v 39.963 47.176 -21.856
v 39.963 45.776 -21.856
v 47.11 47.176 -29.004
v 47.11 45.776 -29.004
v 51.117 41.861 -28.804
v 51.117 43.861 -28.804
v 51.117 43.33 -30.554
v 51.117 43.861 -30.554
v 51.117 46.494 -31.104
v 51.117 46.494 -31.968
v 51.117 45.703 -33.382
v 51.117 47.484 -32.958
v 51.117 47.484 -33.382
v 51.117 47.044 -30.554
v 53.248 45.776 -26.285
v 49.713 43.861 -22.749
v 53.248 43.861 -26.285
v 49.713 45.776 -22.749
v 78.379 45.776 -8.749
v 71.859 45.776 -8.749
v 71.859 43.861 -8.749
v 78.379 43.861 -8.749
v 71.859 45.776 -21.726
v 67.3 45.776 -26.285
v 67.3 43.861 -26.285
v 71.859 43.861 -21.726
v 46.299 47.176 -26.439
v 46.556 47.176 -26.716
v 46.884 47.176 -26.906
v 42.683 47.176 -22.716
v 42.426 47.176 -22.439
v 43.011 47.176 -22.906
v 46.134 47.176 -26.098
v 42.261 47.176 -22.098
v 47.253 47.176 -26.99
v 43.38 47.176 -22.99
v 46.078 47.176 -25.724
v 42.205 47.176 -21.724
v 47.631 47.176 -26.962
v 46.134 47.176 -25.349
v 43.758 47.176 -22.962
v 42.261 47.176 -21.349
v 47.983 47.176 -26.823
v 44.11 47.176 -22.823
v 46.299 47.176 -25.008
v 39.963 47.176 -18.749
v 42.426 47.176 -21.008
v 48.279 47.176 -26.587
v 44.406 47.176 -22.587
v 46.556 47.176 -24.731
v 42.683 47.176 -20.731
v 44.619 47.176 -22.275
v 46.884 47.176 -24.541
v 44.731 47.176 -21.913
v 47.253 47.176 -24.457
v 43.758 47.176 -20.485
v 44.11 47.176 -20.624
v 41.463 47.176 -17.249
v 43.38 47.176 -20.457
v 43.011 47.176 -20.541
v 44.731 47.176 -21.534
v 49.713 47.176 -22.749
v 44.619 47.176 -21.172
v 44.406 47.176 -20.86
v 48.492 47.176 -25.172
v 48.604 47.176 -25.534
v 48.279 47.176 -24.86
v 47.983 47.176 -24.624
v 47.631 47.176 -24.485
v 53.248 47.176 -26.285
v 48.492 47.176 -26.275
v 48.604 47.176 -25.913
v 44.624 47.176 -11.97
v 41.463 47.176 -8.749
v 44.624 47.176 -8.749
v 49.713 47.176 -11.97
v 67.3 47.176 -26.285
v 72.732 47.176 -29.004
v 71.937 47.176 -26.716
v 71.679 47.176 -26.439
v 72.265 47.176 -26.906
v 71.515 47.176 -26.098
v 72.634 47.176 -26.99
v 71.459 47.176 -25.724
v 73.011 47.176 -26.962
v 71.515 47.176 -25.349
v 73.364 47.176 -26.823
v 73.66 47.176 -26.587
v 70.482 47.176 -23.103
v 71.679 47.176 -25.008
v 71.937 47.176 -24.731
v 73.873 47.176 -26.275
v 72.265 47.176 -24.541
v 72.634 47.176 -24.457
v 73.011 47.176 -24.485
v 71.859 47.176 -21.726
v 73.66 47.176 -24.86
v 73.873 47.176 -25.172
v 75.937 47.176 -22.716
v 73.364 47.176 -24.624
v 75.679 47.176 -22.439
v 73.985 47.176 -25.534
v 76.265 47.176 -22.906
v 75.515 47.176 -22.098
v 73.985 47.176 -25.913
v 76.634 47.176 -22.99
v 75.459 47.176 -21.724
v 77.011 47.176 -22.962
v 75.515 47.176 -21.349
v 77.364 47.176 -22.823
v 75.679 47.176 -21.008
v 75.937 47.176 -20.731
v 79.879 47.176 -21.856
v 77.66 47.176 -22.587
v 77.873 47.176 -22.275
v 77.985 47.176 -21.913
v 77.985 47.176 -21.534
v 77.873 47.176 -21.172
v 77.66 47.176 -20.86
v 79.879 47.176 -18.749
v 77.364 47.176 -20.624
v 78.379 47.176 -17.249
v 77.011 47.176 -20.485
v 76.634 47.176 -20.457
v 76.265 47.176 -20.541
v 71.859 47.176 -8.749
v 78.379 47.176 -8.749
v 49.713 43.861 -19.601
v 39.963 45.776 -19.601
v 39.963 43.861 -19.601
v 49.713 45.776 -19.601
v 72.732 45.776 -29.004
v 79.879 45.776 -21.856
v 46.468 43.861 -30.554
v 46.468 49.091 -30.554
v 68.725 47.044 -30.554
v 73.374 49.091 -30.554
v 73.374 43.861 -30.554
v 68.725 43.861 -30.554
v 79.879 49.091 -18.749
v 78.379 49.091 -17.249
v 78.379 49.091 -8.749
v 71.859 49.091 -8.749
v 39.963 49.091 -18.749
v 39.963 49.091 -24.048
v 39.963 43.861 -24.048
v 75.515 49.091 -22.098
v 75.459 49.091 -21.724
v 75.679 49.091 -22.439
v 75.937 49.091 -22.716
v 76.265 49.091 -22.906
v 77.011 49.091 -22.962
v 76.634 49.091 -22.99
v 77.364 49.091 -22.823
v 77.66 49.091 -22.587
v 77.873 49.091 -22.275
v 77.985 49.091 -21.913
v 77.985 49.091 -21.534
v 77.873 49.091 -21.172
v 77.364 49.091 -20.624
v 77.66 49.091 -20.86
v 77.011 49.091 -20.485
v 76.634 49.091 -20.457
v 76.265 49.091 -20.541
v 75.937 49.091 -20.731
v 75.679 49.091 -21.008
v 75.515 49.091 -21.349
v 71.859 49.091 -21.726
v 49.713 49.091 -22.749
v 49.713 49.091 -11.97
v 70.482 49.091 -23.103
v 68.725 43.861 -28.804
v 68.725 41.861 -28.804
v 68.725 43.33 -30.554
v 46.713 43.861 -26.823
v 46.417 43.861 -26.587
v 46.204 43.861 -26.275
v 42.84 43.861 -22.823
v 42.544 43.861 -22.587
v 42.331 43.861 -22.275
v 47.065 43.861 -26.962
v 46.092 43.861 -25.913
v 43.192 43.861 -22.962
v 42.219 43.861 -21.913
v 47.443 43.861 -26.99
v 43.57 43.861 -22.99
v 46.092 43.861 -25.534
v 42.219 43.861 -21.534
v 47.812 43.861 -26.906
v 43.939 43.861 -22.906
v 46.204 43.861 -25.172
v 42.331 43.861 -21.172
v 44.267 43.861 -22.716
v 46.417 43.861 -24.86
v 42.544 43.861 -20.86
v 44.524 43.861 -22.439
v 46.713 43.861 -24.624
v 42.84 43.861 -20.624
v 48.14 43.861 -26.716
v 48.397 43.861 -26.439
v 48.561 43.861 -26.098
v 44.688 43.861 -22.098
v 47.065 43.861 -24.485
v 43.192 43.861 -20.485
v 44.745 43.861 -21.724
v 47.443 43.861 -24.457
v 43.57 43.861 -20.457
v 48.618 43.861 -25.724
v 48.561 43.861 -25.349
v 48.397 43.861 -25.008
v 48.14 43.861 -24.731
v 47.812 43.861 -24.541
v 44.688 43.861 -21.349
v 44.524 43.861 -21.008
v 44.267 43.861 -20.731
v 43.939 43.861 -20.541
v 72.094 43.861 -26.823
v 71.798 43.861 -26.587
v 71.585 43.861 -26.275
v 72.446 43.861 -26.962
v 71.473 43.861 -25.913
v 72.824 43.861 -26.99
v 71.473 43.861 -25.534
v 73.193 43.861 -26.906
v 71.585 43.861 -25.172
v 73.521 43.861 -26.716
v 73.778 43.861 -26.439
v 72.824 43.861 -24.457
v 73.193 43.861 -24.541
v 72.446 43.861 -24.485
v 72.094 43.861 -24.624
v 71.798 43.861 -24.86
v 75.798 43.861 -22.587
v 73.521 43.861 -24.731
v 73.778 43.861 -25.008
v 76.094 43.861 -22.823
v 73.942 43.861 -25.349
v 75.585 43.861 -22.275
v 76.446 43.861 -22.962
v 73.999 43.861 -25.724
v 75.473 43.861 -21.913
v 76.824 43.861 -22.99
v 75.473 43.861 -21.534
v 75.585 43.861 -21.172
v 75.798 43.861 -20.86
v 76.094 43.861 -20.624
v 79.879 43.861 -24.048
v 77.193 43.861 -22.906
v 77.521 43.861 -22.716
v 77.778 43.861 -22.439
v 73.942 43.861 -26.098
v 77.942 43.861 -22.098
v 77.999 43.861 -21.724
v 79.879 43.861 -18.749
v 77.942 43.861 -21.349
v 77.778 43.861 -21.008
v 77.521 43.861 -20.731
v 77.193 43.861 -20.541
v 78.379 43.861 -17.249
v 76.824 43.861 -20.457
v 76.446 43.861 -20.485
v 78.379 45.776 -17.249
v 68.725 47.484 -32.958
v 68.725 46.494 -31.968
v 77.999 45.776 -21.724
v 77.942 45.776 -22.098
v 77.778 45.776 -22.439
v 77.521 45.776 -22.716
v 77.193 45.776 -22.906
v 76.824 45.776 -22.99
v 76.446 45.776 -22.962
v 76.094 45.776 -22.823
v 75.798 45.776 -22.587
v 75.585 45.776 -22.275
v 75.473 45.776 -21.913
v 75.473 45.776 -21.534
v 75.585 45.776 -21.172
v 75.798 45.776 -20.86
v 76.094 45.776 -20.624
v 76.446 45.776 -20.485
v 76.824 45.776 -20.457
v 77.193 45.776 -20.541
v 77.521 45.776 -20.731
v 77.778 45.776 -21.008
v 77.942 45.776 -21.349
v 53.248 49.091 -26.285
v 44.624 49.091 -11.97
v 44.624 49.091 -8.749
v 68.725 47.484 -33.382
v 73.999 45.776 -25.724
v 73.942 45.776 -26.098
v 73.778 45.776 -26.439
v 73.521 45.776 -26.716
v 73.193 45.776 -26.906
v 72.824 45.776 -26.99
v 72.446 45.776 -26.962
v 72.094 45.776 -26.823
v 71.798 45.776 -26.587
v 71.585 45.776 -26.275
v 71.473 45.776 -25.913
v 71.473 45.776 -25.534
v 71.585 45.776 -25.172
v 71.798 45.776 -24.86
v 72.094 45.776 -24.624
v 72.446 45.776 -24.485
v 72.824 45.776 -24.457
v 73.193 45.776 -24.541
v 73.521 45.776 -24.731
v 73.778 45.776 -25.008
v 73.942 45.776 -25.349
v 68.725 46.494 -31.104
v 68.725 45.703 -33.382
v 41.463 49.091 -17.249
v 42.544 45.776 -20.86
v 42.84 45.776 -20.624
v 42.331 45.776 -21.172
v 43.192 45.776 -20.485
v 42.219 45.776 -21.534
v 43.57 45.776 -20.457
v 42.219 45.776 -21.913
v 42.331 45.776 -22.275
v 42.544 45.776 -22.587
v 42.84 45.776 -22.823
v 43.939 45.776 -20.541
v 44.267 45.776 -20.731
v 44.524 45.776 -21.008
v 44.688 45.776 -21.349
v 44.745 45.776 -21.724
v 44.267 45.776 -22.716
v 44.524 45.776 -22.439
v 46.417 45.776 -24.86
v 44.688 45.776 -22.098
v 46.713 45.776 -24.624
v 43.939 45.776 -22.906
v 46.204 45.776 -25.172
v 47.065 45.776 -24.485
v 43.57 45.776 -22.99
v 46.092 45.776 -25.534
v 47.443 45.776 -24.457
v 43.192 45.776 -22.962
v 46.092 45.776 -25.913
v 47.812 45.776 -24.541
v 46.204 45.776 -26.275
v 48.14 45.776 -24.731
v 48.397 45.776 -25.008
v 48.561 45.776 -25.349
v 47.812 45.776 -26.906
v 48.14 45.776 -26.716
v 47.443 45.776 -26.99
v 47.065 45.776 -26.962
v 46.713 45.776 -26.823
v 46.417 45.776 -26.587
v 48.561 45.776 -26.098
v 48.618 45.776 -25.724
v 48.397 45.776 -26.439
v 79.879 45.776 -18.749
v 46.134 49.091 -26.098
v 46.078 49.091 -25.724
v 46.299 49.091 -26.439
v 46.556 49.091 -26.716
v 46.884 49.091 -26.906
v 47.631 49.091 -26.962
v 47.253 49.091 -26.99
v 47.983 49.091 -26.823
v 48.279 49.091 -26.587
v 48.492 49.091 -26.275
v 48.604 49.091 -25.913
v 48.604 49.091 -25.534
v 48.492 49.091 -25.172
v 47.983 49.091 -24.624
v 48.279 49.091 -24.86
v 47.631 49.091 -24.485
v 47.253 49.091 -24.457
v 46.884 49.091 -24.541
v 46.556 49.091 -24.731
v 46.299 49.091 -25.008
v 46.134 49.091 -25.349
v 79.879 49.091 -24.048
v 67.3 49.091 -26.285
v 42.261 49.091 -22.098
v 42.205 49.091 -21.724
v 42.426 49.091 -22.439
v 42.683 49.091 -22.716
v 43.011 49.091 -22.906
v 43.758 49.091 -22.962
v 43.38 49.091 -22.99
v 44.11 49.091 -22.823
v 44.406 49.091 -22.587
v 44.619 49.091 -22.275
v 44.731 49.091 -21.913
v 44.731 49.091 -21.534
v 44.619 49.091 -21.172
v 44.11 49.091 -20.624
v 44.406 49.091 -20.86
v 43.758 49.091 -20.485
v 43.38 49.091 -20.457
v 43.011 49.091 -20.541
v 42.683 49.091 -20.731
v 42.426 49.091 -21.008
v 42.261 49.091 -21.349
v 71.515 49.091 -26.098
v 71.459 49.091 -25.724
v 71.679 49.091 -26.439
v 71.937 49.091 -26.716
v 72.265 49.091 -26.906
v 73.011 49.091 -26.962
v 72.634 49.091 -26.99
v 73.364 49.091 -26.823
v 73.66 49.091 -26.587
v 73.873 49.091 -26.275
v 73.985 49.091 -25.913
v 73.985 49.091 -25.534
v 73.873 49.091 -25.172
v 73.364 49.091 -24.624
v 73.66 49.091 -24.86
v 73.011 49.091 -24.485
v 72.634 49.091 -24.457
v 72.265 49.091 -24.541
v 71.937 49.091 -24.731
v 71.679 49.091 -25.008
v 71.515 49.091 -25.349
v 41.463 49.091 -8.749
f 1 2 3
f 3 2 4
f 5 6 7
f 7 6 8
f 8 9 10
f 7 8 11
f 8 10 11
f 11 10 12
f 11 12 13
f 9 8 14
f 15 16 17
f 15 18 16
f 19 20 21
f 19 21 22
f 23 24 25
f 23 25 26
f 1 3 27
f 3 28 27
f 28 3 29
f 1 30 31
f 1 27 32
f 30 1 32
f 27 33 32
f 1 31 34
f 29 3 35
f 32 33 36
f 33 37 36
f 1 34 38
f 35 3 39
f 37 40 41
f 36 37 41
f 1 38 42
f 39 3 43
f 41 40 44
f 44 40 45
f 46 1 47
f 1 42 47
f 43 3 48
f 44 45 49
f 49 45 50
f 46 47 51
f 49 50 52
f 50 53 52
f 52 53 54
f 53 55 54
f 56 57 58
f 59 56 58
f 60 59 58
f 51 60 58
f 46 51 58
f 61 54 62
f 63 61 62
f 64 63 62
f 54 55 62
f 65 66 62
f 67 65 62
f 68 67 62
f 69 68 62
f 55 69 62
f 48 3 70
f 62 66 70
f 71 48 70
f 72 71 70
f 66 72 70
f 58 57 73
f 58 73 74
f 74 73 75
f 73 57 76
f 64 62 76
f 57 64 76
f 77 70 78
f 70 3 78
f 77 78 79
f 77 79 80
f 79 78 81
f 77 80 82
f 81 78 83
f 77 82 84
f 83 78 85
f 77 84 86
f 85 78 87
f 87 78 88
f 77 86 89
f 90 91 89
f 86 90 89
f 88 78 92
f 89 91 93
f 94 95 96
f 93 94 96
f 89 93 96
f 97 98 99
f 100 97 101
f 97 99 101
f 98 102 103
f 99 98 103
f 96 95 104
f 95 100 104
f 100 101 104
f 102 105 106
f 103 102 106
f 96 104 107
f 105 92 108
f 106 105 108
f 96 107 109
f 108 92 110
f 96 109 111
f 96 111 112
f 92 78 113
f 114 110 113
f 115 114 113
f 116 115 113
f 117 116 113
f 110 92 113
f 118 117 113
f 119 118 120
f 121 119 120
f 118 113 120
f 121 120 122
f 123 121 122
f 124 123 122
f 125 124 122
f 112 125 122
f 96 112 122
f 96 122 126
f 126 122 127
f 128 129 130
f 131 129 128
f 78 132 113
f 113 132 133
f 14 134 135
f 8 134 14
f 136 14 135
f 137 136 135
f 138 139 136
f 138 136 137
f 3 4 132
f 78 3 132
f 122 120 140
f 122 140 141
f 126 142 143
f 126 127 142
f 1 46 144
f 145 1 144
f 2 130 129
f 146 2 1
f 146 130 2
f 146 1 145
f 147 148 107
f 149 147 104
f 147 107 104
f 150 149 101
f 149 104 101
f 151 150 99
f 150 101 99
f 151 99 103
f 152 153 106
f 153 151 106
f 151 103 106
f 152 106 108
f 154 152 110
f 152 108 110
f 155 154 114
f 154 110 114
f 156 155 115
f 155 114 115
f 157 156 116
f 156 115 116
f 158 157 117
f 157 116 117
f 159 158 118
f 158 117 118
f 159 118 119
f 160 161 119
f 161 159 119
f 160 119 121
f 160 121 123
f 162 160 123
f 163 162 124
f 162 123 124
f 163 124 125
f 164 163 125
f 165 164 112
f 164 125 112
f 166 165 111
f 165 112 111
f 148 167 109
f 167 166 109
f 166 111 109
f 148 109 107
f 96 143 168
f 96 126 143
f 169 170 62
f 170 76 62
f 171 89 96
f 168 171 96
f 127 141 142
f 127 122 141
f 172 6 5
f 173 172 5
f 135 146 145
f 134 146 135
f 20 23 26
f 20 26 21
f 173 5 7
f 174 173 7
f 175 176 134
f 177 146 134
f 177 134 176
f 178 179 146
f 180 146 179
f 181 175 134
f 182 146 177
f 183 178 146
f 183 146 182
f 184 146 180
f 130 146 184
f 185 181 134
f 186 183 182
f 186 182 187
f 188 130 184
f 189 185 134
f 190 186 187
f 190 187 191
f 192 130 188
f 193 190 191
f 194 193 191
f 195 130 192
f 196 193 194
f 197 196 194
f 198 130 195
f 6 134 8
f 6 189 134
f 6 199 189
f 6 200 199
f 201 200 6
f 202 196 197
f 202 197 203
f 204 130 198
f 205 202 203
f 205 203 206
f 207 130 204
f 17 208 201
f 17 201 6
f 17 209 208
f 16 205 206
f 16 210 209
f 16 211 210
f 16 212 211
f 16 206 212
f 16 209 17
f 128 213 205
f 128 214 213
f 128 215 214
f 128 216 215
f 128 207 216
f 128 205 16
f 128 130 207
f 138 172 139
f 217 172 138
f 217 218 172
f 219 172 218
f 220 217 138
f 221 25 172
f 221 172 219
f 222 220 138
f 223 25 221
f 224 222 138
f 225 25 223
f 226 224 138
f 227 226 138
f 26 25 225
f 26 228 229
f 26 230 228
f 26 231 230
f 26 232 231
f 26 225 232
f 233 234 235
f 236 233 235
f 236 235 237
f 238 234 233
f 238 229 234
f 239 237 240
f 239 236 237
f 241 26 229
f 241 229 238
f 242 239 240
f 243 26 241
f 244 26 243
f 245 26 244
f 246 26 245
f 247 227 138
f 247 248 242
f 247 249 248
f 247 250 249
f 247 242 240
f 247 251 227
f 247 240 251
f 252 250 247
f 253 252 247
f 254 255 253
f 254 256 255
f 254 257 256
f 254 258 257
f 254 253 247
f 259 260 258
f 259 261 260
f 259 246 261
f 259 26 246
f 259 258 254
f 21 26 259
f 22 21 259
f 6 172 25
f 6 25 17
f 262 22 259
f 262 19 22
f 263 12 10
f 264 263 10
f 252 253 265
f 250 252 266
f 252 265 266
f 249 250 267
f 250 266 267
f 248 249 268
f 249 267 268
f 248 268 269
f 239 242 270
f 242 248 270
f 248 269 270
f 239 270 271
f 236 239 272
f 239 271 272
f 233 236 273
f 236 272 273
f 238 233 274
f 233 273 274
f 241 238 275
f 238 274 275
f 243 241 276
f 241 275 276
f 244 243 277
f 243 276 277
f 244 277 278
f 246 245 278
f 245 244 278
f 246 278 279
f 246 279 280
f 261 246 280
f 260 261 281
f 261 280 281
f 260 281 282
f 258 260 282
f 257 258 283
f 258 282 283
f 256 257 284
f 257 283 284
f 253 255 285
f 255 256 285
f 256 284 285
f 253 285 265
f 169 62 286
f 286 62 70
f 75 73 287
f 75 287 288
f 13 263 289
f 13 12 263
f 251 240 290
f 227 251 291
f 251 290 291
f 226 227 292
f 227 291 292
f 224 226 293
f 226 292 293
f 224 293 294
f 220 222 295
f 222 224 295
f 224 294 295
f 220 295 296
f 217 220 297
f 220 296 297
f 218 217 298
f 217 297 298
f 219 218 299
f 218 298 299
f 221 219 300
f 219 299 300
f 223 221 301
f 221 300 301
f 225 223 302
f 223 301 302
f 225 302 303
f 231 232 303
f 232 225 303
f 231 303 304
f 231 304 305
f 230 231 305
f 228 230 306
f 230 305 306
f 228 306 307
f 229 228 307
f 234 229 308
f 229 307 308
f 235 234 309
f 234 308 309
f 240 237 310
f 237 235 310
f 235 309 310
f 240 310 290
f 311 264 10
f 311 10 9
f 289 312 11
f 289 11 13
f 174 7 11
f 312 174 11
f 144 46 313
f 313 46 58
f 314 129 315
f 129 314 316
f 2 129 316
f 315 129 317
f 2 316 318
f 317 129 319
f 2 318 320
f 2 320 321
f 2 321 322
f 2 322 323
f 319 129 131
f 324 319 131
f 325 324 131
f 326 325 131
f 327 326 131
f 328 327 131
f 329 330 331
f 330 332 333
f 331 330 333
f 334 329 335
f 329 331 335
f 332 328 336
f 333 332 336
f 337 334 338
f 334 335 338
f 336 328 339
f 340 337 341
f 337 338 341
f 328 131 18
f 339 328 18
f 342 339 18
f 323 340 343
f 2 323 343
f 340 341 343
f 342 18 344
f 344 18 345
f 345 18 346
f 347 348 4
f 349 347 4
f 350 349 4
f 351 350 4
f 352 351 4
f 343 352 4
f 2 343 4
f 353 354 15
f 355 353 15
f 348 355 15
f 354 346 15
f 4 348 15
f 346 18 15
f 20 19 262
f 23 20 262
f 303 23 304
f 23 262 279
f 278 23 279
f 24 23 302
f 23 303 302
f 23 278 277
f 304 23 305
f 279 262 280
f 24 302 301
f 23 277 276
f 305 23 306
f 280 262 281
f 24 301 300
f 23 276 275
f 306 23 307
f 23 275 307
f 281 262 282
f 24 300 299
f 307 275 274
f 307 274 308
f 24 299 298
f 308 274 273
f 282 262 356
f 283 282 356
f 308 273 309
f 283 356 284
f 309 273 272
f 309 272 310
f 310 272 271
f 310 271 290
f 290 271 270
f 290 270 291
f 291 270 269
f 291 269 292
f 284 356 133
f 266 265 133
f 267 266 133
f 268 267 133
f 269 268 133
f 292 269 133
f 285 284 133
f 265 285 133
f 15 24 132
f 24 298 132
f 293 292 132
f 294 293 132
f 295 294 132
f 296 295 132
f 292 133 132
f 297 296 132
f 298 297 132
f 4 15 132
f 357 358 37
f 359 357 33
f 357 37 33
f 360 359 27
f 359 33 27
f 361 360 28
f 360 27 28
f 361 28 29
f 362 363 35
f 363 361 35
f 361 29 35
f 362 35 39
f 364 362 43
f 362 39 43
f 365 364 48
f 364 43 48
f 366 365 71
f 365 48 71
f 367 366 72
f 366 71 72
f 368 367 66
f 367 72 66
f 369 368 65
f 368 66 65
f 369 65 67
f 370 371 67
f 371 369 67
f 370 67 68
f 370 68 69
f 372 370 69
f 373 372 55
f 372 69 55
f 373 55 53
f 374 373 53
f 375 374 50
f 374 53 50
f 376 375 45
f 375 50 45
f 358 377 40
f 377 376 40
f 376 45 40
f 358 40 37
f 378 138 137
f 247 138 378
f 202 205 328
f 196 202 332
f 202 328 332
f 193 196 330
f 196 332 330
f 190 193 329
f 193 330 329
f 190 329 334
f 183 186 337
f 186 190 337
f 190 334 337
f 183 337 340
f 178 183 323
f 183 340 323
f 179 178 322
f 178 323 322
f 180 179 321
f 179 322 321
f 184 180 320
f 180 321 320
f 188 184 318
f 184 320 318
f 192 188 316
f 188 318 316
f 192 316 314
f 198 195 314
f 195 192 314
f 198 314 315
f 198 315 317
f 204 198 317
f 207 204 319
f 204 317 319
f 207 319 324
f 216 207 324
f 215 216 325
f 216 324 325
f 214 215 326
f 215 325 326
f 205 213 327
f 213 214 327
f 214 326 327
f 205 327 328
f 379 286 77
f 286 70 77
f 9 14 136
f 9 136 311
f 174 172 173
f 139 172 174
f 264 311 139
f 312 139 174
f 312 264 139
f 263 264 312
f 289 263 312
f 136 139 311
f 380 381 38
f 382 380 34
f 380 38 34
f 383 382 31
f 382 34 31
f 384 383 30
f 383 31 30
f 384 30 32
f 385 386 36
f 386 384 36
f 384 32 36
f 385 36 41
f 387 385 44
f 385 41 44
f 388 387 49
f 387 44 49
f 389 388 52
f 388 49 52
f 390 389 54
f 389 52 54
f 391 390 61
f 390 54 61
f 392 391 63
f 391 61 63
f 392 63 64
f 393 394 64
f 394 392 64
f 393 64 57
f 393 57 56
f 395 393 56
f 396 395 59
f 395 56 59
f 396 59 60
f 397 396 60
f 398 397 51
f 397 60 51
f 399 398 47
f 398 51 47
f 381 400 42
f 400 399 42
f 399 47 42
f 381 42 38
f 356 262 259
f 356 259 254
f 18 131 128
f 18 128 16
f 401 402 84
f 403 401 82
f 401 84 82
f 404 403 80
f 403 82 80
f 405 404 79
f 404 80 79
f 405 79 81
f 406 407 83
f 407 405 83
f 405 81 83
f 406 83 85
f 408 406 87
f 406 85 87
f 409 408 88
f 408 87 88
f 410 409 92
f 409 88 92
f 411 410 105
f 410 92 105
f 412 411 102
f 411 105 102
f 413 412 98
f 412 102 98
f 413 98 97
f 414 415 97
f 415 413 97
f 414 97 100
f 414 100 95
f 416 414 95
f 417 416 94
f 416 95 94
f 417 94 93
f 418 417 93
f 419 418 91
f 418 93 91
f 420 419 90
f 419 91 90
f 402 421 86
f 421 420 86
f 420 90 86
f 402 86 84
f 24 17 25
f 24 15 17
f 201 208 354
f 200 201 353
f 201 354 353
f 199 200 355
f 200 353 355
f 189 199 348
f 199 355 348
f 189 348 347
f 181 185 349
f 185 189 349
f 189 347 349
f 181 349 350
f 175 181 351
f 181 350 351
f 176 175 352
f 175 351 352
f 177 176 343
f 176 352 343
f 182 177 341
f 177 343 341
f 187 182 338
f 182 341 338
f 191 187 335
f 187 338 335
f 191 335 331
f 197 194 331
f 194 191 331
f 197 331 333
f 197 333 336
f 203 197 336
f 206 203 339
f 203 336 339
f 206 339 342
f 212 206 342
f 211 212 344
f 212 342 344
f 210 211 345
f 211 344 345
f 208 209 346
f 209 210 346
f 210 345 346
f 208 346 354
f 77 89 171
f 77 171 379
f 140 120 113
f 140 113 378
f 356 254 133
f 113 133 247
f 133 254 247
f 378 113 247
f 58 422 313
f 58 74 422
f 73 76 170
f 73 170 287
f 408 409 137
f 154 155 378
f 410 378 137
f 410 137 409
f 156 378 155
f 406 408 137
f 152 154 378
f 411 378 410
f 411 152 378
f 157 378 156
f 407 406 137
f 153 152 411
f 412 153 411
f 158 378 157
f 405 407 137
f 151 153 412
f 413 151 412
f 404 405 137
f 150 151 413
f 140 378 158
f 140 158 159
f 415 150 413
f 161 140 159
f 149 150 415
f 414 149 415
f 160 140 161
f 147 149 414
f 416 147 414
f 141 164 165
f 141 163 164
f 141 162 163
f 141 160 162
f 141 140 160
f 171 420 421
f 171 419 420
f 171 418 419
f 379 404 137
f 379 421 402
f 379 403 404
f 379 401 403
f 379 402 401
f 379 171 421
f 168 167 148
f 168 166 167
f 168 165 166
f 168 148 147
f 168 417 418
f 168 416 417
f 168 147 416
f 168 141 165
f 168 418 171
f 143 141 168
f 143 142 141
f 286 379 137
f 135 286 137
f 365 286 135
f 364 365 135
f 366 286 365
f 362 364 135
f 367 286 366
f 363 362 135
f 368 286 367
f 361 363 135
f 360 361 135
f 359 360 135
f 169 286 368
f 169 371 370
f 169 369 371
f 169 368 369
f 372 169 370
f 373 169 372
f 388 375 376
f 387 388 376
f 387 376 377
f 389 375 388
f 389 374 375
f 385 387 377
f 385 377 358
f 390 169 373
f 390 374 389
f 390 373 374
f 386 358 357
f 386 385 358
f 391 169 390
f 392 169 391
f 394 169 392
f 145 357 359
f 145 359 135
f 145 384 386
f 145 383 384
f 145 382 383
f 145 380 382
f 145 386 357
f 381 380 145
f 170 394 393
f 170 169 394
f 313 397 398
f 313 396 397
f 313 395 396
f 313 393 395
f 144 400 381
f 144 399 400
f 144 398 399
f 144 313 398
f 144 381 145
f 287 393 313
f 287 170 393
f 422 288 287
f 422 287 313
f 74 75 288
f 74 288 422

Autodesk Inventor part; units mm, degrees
ref_plane "Work Plane1" through (59.9208, 47.0911, 21.911) normal (0, 1, 0) x (-1, 0, 0)
sketch "Sketch1" plane through (59.9208, 47.0911, 21.911) normal (0, 1, 0) x (-1, 0, 0)
  circle A0 centre (-16.808, -43.6345) radius 1.27
  circle A1 centre (12.5729, -47.6345) radius 1.27
  circle A2 centre (16.4459, -43.6345) radius 1.27
  circle A3 centre (-12.808, -47.6345) radius 1.27
  line L0 (10.208, -33.8805) -> (10.208, -44.6601)
  line L1 (10.208, -44.6601) -> (6.6725, -48.1956)
  circle A4 centre (-16.808, -43.6345) radius 1.27 projected
  circle A5 centre (12.5729, -47.6345) radius 1.27 projected
  circle A6 centre (16.4459, -43.6345) radius 1.27 projected
  circle A7 centre (-12.8081, -47.6345) radius 1.27 projected
  line L2 (19.708, -15.6655) -> (-19.708, -15.6655)
  line L3 (0, -15.6655) -> (0, -20.8781)
  line L4 (6.6725, -48.1956) -> (-7.3796, -48.1956)
  line L5 (-19.958, -43.8381) -> (-12.8316, -50.9645)
  line L6 (-12.8316, -50.9645) -> (12.8316, -50.9645)
  line L7 (-19.958, -40.6601) -> (-19.958, -43.8381)
  line L8 (0, -48.1956) -> (0, -46.7038)
  line L9 (19.958, -43.8381) -> (12.8316, -50.9645)
  line L10 (19.958, -40.6601) -> (19.958, -43.8381)
  line L11 (-11.938, -30.6601) -> (-11.938, -43.6372)
  line L12 (-10.5616, -45.0137) -> (-11.938, -43.6372)
  line L13 (-10.5616, -45.0137) -> (-7.3796, -48.1956)
  line L14 (15.2967, -30.6601) -> (18.458, -30.6601)
  line L15 (18.458, -30.6601) -> (18.458, -39.1601)
  line L16 (-18.458, -39.1601) -> (-18.458, -30.6601)
  line L17 (-18.458, -30.6601) -> (-11.938, -30.6601)
  line L18 (10.208, -33.8805) -> (15.2967, -33.8805)
  line L19 (15.2967, -33.8805) -> (15.2967, -30.6601)
  line L20 (-19.958, -40.6601) -> (-18.458, -39.1601)
  line L21 (19.958, -40.6601) -> (18.458, -39.1601)
  point P0 (-19.708, -43.6601)
  point P1 (-6.6725, -48.1956)
  dimension "d14" = 5
  dimension "d15" = 135
  dimension "d18" = 2.54
extrude "Extrusion1" add sketch "Sketch1" along normal blind 2
ref_plane "Work Plane2" through (59.9208, 45.8611, 21.911) normal (0, -1, 0) x (1, 0, 0)
sketch "Sketch2" plane through (59.9208, 45.8611, 21.911) normal (0, -1, 0) x (1, 0, 0)
  line L0 (-10.208, -33.8805) -> (-10.208, -44.6601) projected
  line L1 (-10.208, -44.6601) -> (-6.6725, -48.1956) projected
  line L2 (-6.6725, -48.1956) -> (7.3796, -48.1956) projected
  circle A0 centre (16.808, -43.6345) radius 1.27 projected
  circle A1 centre (-12.5729, -47.6345) radius 1.27 projected
  circle A2 centre (-16.4459, -43.6345) radius 1.27 projected
  circle A3 centre (12.808, -47.6345) radius 1.27 projected
  line L3 (19.958, -40.6601) -> (19.958, -43.8381) projected
  line L4 (19.958, -43.8381) -> (12.8316, -50.9645) projected
  line L5 (12.8316, -50.9645) -> (-12.8316, -50.9645) projected
  line L6 (-12.8316, -50.9645) -> (-19.958, -43.8381) projected
  line L7 (-19.958, -43.8381) -> (-19.958, -40.6601) projected
  line L8 (7.3796, -48.1956) -> (11.938, -43.6372) projected
  line L9 (11.938, -43.6372) -> (11.938, -30.6601) projected
  line L10 (11.938, -30.6601) -> (18.458, -30.6601) projected
  line L11 (18.458, -30.6601) -> (18.458, -39.1601) projected
  line L12 (-18.458, -39.1601) -> (-18.458, -30.6601) projected
  line L13 (-18.458, -30.6601) -> (-15.2967, -30.6601) projected
  line L14 (-15.2967, -30.6601) -> (-15.2967, -33.8805) projected
  line L15 (-15.2967, -33.8805) -> (-10.208, -33.8805) projected
  line L16 (18.458, -39.1601) -> (19.958, -40.6601) projected
  line L17 (-19.958, -40.6601) -> (-18.458, -39.1601) projected
  circle A4 centre (-16.4459, -43.6345) radius 1.27 projected
  line L18 (-19.958, -43.8381) -> (-19.958, -40.6601) projected
  line L19 (-19.958, -41.5123) -> (-10.208, -41.5123)
  line L20 (-10.208, -33.8805) -> (-10.208, -44.6601) projected
  point P0 (-59.9208, -21.911)
extrude "Extrusion2" add sketch "Sketch2" along normal blind 2 contours L0 L1 L2 L8 L9 L10 L11 L16 L3 L4 L5 L6 L7 L19
sketch "Sketch4" plane through (79.8789, 45.8611, -18.7491) normal (1, 0, 0) x (0, 0, -1)
  line L0 (0, 1.23) -> (3.178, 1.23) projected
  line L1 (0, 0) -> (-1.5, 0) projected
  line L2 (0, 1.23) -> (0, 0)
  line L3 (-12.1065, -0.085) -> (12.1065, -0.085)
  line L4 (12.1065, -0.085) -> (12.1065, 1.315)
  line L5 (12.1065, 1.315) -> (-12.1065, 1.315)
  line L6 (-12.1065, 1.315) -> (-12.1065, -0.085)
  line L7 (-12.1065, -0.085) -> (12.1065, 1.315) construction
  line L8 (12.1065, -0.085) -> (-12.1065, 1.315) construction
  point P0 (0, 0.615)
  dimension "d73" = 1.4
extrude "Extrusion3" cut sketch "Sketch4" against normal through all
sketch "Sketch5" plane through (59.9208, 43.8611, 21.911) normal (0, -1, 0) x (1, 0, 0)
  line L0 (-19.708, -43.6601) -> (-19.708, -40.6601)
  line L1 (-12.6424, -50.7145) -> (-19.708, -43.6601)
  line L2 (12.728, -50.7145) -> (-12.6424, -50.7145)
  line L3 (19.708, -43.7345) -> (12.728, -50.7145)
  line L4 (-13.4529, -52.4645) -> (13.4529, -52.4645)
  line L5 (19.708, -43.7345) -> (19.708, -40.6601)
  line L6 (-12.8316, -50.9145) -> (12.8316, -50.9145)
  line L7 (12.8316, -50.9645) -> (11.3316, -52.4645)
  line L8 (-19.958, -43.8381) -> (-12.8316, -50.9645)
  line L9 (-12.8316, -50.9645) -> (-11.3316, -52.4645)
  line L10 (-12.8316, -50.9645) -> (-10.7103, -50.9645) construction
  line L11 (12.8316, -50.9145) -> (12.8816, -50.9145)
  line L12 (-12.8316, -50.9645) -> (12.8316, -50.9645)
  line L13 (12.8316, -50.9645) -> (12.8816, -50.9145)
  line L14 (12.8316, -50.9645) -> (19.958, -43.8381)
  line L15 (-12.8316, -50.9145) -> (-12.8816, -50.9145)
  line L16 (-12.8316, -50.9645) -> (-12.8816, -50.9145)
  line L17 (12.8109, -50.9145) -> (19.958, -43.7673)
  line L18 (-19.958, -43.7673) -> (-12.8109, -50.9145)
  line L19 (-19.958, -45.9594) -> (-13.4529, -52.4645)
  line L20 (13.4529, -52.4645) -> (19.958, -45.9594)
  line L21 (-19.958, -43.7673) -> (-19.958, -45.9594)
  line L22 (12.8316, -50.9645) -> (19.958, -43.8381) projected
  line L23 (19.958, -43.8381) -> (19.958, -45.9594)
  line L24 (19.958, -43.8381) -> (19.958, -43.7673)
  line L25 (19.958, -43.8381) -> (19.958, -40.6601) projected
  dimension "d29" = 0.2
  dimension "d62" = 45
  dimension "d74" = 0.05
  dimension "d75" = 0.05
  dimension "d76" = 1.5
  dimension "d77" = 1.5
extrude "Extrusion4" add sketch "Sketch5" against normal up to surface (5.23 mm away)
ref_plane "Work Plane13" through (59.9208, 43.8611, -18.7491) normal (1, 0, 0) x (0, 0, -1)
ref_plane "Work Plane14" through (53.2483, 46.4761, -26.2847) normal (0, 1, 0) x (1, 0, 0)
sketch "Sketch18" plane through (59.9208, 43.8611, -18.7491) normal (1, 0, 0) x (0, 0, -1)
  line L0 (11.8044, 0) -> (10.0544, 0)
  line L1 (10.0544, 0) -> (10.0544, -2)
  line L2 (10.0544, -2) -> (11.8044, -0.5316)
  line L3 (11.8044, -0.5316) -> (11.8044, 0)
  line L4 (14.6328, 1.8418) -> (14.6328, 3.6226)
  line L5 (14.2086, 3.6226) -> (13.2186, 2.6326)
  line L6 (13.2186, 2.6326) -> (12.3544, 2.6326)
  line L7 (11.8044, 3.1826) -> (11.8044, 0)
  line L8 (11.8044, -0.5316) -> (14.6328, 1.8418)
  line L9 (11.8044, -0.5316) -> (15.8044, -0.5316) construction
  line L10 (14.2086, 3.6226) -> (14.6328, 3.6226)
  line L11 (11.9924, 3.2605) -> (12.4323, 2.8206)
  line L12 (11.8044, 3.1826) -> (12.3544, 2.6326)
  dimension "d184" = 1.75
  dimension "d185" = 2
  dimension "d186" = 50
  dimension "d198" = 135
  dimension "d203" = 40
extrude "Extrusion12" add sketch "Sketch18" along normal blind 8.804 and the other way blind 8.804
properties part number "Button Holder"
